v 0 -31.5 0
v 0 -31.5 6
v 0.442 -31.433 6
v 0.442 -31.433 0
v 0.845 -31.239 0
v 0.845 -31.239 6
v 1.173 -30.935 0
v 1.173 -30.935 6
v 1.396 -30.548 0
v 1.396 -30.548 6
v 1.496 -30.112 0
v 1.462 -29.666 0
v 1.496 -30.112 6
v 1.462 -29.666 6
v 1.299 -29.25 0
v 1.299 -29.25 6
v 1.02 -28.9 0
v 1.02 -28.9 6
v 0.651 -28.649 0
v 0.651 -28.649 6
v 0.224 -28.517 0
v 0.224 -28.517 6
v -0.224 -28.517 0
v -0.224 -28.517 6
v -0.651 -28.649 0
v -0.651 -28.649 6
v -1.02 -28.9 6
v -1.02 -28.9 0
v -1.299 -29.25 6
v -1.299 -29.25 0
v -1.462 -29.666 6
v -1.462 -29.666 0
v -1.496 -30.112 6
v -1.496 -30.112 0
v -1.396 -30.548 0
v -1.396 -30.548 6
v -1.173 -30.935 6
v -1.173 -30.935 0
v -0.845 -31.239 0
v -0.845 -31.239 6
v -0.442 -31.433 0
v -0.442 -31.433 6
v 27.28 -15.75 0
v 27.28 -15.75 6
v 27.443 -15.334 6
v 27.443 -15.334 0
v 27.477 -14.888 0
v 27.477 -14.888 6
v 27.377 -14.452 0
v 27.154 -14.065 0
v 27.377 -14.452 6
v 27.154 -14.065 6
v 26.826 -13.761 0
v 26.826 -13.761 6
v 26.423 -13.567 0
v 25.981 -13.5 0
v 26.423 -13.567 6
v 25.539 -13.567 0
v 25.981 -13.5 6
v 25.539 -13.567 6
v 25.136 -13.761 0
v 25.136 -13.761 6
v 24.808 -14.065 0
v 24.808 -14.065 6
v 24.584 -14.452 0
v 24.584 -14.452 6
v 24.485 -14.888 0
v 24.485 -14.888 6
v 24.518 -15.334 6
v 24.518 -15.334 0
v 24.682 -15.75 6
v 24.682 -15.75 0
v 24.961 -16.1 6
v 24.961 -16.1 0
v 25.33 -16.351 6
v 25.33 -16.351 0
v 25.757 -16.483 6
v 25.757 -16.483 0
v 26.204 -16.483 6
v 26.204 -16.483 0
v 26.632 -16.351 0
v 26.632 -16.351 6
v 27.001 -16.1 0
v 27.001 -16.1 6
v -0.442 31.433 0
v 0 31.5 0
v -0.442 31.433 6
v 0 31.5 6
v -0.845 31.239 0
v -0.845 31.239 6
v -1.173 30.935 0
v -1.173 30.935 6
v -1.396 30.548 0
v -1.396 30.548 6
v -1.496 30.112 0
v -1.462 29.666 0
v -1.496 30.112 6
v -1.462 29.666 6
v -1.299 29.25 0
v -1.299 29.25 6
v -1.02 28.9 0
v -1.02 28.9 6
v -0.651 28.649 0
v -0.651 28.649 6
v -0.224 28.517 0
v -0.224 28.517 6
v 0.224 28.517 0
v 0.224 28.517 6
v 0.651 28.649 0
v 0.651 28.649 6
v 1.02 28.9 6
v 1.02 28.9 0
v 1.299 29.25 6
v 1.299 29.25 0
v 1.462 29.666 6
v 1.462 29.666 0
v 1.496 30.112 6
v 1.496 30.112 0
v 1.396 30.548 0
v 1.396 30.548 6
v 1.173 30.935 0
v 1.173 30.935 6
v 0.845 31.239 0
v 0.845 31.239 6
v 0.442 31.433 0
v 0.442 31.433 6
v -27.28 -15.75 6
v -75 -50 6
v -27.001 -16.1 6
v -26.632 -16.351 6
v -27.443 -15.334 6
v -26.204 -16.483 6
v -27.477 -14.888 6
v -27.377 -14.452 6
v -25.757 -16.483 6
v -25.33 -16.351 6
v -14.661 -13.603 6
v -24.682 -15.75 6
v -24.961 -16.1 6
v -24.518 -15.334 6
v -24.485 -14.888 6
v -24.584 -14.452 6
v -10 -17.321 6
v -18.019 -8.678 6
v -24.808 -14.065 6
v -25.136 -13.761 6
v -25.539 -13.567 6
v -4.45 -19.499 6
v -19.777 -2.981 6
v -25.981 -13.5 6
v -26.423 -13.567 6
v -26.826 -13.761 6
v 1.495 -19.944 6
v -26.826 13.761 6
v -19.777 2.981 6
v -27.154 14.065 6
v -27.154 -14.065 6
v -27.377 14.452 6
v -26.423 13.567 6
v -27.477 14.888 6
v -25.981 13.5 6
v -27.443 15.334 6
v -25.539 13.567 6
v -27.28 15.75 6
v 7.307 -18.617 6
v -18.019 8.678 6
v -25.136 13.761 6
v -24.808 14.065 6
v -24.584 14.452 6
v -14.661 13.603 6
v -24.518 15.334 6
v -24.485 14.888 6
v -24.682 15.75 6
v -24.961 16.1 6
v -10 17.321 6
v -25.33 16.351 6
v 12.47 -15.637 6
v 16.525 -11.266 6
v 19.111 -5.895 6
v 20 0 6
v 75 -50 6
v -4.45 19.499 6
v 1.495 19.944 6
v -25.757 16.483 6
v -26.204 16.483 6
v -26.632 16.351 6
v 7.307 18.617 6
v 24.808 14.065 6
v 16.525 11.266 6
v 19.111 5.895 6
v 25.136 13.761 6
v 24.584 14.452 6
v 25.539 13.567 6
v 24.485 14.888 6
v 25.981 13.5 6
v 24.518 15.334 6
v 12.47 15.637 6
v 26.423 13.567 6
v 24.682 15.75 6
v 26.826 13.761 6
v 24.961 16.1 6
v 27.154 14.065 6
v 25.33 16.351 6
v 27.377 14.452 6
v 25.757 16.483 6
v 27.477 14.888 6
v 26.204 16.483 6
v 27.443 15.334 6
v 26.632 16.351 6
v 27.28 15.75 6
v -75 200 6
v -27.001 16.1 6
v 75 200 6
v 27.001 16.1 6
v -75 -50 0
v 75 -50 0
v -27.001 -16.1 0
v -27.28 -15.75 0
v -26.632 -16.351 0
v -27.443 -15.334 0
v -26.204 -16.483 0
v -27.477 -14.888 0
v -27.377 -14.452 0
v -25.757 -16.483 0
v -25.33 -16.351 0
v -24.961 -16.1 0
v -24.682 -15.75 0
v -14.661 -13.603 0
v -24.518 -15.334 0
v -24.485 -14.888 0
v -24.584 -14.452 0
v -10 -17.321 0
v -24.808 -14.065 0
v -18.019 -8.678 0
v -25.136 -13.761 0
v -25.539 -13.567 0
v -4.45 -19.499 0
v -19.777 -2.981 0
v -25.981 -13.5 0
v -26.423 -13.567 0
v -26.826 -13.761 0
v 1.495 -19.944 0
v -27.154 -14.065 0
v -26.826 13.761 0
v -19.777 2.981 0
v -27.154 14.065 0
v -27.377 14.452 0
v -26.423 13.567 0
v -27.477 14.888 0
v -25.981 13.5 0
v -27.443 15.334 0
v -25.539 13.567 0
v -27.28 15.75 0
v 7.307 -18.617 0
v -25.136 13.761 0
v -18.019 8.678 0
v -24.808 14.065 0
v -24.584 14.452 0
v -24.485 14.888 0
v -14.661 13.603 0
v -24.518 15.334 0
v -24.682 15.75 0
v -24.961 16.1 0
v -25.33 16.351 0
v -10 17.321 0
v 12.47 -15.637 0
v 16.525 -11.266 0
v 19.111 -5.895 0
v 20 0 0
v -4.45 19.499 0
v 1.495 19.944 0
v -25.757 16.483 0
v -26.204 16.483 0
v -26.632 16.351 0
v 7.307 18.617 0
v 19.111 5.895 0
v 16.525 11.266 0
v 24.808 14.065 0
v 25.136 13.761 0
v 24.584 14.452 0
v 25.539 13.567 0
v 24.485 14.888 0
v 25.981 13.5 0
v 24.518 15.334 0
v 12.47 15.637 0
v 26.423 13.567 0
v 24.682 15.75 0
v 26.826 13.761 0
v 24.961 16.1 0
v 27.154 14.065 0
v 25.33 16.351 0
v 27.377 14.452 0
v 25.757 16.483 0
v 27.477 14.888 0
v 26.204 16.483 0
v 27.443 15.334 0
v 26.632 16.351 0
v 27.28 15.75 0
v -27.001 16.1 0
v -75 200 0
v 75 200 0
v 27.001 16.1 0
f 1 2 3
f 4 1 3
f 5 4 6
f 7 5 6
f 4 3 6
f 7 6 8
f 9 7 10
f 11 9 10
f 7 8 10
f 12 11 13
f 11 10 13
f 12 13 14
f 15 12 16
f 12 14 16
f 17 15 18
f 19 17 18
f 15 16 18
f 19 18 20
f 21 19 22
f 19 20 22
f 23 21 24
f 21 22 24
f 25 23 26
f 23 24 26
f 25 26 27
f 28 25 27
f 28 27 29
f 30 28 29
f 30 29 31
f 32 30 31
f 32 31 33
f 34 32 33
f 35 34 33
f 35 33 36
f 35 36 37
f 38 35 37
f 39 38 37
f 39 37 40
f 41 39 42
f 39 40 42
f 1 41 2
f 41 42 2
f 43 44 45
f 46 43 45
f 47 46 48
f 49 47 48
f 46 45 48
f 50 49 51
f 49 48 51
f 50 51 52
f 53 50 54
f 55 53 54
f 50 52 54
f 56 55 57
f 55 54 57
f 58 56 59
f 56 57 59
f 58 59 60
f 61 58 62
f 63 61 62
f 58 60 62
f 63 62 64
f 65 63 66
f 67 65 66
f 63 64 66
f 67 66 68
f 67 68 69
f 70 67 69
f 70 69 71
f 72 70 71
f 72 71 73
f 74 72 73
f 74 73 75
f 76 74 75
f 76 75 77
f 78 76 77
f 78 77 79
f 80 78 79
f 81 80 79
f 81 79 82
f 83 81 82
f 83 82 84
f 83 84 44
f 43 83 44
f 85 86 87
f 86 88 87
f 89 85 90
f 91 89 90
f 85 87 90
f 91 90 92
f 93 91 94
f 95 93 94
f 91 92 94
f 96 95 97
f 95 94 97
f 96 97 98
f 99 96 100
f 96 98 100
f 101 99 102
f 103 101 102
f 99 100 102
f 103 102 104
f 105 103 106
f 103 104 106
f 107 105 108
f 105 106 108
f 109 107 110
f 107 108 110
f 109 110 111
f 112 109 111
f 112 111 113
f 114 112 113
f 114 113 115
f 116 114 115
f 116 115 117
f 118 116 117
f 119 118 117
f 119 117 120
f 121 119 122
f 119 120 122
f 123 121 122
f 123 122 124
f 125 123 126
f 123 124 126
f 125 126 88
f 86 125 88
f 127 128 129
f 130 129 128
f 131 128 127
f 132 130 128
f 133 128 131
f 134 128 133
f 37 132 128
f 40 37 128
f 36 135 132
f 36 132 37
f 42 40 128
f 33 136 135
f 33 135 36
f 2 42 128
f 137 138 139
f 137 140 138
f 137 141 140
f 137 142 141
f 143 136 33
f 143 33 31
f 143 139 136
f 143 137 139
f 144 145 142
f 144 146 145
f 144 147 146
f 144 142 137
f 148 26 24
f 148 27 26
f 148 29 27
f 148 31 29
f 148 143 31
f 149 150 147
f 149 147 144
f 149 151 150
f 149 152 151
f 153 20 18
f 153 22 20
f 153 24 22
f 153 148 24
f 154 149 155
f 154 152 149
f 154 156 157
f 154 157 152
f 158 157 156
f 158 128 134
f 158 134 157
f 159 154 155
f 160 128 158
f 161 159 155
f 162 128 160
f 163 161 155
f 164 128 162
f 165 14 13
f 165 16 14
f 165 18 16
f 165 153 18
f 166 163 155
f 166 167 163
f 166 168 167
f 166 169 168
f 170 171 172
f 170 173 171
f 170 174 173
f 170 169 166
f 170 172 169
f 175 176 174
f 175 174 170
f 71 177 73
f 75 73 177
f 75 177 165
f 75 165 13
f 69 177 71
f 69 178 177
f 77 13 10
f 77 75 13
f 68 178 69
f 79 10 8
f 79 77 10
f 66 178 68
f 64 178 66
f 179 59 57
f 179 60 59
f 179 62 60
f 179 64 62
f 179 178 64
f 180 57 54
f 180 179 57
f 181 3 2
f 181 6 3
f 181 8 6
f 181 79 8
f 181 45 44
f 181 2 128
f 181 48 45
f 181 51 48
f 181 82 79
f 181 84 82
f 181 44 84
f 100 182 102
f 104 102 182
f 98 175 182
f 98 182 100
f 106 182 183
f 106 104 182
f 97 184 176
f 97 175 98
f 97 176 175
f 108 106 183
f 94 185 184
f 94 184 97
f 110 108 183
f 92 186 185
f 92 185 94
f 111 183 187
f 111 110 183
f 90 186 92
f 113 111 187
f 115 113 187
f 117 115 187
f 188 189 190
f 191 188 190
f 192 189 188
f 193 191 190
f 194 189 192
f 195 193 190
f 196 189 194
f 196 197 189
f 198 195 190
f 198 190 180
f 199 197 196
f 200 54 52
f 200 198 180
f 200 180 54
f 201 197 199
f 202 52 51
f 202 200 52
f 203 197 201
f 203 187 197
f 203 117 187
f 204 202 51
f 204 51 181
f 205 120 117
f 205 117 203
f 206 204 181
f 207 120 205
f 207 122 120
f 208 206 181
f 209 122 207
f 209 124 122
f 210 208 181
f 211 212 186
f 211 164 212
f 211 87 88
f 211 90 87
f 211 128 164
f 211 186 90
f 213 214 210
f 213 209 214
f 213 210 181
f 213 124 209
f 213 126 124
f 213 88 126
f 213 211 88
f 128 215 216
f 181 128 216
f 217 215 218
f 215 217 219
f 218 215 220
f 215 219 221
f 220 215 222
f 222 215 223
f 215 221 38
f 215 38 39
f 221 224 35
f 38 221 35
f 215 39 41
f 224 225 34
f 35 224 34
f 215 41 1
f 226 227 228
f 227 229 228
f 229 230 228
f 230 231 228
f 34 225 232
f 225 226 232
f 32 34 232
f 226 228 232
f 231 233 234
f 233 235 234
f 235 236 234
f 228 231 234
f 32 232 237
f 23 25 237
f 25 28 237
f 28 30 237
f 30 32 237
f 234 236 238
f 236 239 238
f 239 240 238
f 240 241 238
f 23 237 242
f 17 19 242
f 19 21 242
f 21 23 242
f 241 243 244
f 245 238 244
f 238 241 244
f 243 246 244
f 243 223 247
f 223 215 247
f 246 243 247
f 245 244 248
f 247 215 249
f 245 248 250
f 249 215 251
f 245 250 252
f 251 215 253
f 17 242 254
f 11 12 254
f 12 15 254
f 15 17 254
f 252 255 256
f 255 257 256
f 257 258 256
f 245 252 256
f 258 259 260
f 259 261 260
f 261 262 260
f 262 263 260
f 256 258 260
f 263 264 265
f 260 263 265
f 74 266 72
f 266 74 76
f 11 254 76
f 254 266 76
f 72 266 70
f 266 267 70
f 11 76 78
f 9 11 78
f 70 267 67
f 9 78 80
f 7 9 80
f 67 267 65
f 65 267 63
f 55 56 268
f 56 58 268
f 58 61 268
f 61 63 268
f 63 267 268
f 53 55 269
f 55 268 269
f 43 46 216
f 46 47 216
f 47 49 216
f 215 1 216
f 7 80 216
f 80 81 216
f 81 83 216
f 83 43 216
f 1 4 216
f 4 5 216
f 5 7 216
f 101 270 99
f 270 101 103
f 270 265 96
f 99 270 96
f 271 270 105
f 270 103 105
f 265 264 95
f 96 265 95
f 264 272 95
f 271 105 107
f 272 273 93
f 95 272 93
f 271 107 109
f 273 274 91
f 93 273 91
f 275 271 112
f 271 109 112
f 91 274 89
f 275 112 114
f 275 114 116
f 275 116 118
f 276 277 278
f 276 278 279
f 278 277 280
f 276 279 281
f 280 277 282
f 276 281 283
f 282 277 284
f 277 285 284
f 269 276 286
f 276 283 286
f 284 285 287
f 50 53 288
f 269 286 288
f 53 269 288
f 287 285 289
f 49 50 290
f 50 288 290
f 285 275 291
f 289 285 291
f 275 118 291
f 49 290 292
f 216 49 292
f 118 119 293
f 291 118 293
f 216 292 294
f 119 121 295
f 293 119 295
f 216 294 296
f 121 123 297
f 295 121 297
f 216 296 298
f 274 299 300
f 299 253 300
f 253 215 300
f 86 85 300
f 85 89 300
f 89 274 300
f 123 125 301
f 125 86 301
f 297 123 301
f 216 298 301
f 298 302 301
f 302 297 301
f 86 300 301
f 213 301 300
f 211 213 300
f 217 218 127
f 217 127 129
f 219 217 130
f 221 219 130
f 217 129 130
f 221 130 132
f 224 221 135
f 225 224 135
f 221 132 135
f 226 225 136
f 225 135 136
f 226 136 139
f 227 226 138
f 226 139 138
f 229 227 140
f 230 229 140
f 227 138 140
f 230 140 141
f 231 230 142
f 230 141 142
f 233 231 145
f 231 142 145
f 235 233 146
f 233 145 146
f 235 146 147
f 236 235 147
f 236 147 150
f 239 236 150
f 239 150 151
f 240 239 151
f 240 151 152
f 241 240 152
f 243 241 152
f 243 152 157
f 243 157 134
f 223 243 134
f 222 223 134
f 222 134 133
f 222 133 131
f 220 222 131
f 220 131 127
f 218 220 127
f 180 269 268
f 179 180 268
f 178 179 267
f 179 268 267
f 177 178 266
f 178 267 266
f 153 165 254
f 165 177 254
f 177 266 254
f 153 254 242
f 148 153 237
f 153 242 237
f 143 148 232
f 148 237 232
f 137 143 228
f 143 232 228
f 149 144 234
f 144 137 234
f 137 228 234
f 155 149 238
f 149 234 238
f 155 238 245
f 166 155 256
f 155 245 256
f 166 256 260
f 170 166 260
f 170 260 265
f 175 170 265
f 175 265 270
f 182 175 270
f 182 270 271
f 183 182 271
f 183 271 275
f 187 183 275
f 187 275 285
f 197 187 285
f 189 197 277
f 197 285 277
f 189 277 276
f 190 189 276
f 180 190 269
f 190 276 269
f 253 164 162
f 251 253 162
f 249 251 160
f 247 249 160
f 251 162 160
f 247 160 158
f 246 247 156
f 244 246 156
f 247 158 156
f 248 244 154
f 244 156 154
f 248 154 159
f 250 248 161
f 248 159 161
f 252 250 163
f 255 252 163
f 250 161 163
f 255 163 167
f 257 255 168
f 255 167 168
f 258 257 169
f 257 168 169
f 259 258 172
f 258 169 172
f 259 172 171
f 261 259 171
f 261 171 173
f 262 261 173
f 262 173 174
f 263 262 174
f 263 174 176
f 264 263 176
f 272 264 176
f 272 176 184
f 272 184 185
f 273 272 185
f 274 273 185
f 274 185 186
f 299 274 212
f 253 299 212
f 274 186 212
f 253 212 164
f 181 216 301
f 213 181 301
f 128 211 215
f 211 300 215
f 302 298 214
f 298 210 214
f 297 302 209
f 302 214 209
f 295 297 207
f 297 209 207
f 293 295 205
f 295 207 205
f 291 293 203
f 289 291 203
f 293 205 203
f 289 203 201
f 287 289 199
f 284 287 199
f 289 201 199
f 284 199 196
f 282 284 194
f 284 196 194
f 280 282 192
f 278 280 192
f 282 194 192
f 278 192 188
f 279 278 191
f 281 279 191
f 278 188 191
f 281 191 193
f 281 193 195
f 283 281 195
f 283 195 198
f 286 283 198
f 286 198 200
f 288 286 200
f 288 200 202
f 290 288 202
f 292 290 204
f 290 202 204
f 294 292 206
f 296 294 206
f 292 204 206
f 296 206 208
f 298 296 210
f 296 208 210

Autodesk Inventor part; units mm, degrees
ref_plane "YZ Plane" through (0, 0, 0) normal (1, 0, 0) x (0, 1, 0)
ref_plane "XZ Plane" through (0, 0, 0) normal (0, 1, 0) x (-1, 0, 0)
ref_plane "XY Plane" through (0, 0, 0) normal (0, 0, 1) x (1, 0, 0)
sketch "Sketch1" plane through (0, 0, 0) normal (0, 0, 1) x (1, 0, 0)
  line L0 (-75, -50) -> (75, -50)
  line L1 (75, -50) -> (75, 200)
  line L2 (75, 200) -> (-75, 200)
  line L3 (-75, 200) -> (-75, -50)
  circle A0 centre (0, 0) radius 20
  line L4 (0, 0) -> (0, 30) construction
  dimension "d0" = 150
  dimension "d1" = 250
  dimension "d2" = 40
  dimension "d16" = 30
  dimension "d17" = 50
extrude "Extrusion1" add sketch "Sketch1" along normal blind 6
hole "Hole1" at (0, 30, 0) direction (0, 0, 1) diameter 3 end through all
pattern_circular "Circular Pattern1" count 6 over 360 about axis through (0, 0, 0) along (0, 0, 1) of "Hole1"
properties part number "base_plate" material "Plywood, Finish"
